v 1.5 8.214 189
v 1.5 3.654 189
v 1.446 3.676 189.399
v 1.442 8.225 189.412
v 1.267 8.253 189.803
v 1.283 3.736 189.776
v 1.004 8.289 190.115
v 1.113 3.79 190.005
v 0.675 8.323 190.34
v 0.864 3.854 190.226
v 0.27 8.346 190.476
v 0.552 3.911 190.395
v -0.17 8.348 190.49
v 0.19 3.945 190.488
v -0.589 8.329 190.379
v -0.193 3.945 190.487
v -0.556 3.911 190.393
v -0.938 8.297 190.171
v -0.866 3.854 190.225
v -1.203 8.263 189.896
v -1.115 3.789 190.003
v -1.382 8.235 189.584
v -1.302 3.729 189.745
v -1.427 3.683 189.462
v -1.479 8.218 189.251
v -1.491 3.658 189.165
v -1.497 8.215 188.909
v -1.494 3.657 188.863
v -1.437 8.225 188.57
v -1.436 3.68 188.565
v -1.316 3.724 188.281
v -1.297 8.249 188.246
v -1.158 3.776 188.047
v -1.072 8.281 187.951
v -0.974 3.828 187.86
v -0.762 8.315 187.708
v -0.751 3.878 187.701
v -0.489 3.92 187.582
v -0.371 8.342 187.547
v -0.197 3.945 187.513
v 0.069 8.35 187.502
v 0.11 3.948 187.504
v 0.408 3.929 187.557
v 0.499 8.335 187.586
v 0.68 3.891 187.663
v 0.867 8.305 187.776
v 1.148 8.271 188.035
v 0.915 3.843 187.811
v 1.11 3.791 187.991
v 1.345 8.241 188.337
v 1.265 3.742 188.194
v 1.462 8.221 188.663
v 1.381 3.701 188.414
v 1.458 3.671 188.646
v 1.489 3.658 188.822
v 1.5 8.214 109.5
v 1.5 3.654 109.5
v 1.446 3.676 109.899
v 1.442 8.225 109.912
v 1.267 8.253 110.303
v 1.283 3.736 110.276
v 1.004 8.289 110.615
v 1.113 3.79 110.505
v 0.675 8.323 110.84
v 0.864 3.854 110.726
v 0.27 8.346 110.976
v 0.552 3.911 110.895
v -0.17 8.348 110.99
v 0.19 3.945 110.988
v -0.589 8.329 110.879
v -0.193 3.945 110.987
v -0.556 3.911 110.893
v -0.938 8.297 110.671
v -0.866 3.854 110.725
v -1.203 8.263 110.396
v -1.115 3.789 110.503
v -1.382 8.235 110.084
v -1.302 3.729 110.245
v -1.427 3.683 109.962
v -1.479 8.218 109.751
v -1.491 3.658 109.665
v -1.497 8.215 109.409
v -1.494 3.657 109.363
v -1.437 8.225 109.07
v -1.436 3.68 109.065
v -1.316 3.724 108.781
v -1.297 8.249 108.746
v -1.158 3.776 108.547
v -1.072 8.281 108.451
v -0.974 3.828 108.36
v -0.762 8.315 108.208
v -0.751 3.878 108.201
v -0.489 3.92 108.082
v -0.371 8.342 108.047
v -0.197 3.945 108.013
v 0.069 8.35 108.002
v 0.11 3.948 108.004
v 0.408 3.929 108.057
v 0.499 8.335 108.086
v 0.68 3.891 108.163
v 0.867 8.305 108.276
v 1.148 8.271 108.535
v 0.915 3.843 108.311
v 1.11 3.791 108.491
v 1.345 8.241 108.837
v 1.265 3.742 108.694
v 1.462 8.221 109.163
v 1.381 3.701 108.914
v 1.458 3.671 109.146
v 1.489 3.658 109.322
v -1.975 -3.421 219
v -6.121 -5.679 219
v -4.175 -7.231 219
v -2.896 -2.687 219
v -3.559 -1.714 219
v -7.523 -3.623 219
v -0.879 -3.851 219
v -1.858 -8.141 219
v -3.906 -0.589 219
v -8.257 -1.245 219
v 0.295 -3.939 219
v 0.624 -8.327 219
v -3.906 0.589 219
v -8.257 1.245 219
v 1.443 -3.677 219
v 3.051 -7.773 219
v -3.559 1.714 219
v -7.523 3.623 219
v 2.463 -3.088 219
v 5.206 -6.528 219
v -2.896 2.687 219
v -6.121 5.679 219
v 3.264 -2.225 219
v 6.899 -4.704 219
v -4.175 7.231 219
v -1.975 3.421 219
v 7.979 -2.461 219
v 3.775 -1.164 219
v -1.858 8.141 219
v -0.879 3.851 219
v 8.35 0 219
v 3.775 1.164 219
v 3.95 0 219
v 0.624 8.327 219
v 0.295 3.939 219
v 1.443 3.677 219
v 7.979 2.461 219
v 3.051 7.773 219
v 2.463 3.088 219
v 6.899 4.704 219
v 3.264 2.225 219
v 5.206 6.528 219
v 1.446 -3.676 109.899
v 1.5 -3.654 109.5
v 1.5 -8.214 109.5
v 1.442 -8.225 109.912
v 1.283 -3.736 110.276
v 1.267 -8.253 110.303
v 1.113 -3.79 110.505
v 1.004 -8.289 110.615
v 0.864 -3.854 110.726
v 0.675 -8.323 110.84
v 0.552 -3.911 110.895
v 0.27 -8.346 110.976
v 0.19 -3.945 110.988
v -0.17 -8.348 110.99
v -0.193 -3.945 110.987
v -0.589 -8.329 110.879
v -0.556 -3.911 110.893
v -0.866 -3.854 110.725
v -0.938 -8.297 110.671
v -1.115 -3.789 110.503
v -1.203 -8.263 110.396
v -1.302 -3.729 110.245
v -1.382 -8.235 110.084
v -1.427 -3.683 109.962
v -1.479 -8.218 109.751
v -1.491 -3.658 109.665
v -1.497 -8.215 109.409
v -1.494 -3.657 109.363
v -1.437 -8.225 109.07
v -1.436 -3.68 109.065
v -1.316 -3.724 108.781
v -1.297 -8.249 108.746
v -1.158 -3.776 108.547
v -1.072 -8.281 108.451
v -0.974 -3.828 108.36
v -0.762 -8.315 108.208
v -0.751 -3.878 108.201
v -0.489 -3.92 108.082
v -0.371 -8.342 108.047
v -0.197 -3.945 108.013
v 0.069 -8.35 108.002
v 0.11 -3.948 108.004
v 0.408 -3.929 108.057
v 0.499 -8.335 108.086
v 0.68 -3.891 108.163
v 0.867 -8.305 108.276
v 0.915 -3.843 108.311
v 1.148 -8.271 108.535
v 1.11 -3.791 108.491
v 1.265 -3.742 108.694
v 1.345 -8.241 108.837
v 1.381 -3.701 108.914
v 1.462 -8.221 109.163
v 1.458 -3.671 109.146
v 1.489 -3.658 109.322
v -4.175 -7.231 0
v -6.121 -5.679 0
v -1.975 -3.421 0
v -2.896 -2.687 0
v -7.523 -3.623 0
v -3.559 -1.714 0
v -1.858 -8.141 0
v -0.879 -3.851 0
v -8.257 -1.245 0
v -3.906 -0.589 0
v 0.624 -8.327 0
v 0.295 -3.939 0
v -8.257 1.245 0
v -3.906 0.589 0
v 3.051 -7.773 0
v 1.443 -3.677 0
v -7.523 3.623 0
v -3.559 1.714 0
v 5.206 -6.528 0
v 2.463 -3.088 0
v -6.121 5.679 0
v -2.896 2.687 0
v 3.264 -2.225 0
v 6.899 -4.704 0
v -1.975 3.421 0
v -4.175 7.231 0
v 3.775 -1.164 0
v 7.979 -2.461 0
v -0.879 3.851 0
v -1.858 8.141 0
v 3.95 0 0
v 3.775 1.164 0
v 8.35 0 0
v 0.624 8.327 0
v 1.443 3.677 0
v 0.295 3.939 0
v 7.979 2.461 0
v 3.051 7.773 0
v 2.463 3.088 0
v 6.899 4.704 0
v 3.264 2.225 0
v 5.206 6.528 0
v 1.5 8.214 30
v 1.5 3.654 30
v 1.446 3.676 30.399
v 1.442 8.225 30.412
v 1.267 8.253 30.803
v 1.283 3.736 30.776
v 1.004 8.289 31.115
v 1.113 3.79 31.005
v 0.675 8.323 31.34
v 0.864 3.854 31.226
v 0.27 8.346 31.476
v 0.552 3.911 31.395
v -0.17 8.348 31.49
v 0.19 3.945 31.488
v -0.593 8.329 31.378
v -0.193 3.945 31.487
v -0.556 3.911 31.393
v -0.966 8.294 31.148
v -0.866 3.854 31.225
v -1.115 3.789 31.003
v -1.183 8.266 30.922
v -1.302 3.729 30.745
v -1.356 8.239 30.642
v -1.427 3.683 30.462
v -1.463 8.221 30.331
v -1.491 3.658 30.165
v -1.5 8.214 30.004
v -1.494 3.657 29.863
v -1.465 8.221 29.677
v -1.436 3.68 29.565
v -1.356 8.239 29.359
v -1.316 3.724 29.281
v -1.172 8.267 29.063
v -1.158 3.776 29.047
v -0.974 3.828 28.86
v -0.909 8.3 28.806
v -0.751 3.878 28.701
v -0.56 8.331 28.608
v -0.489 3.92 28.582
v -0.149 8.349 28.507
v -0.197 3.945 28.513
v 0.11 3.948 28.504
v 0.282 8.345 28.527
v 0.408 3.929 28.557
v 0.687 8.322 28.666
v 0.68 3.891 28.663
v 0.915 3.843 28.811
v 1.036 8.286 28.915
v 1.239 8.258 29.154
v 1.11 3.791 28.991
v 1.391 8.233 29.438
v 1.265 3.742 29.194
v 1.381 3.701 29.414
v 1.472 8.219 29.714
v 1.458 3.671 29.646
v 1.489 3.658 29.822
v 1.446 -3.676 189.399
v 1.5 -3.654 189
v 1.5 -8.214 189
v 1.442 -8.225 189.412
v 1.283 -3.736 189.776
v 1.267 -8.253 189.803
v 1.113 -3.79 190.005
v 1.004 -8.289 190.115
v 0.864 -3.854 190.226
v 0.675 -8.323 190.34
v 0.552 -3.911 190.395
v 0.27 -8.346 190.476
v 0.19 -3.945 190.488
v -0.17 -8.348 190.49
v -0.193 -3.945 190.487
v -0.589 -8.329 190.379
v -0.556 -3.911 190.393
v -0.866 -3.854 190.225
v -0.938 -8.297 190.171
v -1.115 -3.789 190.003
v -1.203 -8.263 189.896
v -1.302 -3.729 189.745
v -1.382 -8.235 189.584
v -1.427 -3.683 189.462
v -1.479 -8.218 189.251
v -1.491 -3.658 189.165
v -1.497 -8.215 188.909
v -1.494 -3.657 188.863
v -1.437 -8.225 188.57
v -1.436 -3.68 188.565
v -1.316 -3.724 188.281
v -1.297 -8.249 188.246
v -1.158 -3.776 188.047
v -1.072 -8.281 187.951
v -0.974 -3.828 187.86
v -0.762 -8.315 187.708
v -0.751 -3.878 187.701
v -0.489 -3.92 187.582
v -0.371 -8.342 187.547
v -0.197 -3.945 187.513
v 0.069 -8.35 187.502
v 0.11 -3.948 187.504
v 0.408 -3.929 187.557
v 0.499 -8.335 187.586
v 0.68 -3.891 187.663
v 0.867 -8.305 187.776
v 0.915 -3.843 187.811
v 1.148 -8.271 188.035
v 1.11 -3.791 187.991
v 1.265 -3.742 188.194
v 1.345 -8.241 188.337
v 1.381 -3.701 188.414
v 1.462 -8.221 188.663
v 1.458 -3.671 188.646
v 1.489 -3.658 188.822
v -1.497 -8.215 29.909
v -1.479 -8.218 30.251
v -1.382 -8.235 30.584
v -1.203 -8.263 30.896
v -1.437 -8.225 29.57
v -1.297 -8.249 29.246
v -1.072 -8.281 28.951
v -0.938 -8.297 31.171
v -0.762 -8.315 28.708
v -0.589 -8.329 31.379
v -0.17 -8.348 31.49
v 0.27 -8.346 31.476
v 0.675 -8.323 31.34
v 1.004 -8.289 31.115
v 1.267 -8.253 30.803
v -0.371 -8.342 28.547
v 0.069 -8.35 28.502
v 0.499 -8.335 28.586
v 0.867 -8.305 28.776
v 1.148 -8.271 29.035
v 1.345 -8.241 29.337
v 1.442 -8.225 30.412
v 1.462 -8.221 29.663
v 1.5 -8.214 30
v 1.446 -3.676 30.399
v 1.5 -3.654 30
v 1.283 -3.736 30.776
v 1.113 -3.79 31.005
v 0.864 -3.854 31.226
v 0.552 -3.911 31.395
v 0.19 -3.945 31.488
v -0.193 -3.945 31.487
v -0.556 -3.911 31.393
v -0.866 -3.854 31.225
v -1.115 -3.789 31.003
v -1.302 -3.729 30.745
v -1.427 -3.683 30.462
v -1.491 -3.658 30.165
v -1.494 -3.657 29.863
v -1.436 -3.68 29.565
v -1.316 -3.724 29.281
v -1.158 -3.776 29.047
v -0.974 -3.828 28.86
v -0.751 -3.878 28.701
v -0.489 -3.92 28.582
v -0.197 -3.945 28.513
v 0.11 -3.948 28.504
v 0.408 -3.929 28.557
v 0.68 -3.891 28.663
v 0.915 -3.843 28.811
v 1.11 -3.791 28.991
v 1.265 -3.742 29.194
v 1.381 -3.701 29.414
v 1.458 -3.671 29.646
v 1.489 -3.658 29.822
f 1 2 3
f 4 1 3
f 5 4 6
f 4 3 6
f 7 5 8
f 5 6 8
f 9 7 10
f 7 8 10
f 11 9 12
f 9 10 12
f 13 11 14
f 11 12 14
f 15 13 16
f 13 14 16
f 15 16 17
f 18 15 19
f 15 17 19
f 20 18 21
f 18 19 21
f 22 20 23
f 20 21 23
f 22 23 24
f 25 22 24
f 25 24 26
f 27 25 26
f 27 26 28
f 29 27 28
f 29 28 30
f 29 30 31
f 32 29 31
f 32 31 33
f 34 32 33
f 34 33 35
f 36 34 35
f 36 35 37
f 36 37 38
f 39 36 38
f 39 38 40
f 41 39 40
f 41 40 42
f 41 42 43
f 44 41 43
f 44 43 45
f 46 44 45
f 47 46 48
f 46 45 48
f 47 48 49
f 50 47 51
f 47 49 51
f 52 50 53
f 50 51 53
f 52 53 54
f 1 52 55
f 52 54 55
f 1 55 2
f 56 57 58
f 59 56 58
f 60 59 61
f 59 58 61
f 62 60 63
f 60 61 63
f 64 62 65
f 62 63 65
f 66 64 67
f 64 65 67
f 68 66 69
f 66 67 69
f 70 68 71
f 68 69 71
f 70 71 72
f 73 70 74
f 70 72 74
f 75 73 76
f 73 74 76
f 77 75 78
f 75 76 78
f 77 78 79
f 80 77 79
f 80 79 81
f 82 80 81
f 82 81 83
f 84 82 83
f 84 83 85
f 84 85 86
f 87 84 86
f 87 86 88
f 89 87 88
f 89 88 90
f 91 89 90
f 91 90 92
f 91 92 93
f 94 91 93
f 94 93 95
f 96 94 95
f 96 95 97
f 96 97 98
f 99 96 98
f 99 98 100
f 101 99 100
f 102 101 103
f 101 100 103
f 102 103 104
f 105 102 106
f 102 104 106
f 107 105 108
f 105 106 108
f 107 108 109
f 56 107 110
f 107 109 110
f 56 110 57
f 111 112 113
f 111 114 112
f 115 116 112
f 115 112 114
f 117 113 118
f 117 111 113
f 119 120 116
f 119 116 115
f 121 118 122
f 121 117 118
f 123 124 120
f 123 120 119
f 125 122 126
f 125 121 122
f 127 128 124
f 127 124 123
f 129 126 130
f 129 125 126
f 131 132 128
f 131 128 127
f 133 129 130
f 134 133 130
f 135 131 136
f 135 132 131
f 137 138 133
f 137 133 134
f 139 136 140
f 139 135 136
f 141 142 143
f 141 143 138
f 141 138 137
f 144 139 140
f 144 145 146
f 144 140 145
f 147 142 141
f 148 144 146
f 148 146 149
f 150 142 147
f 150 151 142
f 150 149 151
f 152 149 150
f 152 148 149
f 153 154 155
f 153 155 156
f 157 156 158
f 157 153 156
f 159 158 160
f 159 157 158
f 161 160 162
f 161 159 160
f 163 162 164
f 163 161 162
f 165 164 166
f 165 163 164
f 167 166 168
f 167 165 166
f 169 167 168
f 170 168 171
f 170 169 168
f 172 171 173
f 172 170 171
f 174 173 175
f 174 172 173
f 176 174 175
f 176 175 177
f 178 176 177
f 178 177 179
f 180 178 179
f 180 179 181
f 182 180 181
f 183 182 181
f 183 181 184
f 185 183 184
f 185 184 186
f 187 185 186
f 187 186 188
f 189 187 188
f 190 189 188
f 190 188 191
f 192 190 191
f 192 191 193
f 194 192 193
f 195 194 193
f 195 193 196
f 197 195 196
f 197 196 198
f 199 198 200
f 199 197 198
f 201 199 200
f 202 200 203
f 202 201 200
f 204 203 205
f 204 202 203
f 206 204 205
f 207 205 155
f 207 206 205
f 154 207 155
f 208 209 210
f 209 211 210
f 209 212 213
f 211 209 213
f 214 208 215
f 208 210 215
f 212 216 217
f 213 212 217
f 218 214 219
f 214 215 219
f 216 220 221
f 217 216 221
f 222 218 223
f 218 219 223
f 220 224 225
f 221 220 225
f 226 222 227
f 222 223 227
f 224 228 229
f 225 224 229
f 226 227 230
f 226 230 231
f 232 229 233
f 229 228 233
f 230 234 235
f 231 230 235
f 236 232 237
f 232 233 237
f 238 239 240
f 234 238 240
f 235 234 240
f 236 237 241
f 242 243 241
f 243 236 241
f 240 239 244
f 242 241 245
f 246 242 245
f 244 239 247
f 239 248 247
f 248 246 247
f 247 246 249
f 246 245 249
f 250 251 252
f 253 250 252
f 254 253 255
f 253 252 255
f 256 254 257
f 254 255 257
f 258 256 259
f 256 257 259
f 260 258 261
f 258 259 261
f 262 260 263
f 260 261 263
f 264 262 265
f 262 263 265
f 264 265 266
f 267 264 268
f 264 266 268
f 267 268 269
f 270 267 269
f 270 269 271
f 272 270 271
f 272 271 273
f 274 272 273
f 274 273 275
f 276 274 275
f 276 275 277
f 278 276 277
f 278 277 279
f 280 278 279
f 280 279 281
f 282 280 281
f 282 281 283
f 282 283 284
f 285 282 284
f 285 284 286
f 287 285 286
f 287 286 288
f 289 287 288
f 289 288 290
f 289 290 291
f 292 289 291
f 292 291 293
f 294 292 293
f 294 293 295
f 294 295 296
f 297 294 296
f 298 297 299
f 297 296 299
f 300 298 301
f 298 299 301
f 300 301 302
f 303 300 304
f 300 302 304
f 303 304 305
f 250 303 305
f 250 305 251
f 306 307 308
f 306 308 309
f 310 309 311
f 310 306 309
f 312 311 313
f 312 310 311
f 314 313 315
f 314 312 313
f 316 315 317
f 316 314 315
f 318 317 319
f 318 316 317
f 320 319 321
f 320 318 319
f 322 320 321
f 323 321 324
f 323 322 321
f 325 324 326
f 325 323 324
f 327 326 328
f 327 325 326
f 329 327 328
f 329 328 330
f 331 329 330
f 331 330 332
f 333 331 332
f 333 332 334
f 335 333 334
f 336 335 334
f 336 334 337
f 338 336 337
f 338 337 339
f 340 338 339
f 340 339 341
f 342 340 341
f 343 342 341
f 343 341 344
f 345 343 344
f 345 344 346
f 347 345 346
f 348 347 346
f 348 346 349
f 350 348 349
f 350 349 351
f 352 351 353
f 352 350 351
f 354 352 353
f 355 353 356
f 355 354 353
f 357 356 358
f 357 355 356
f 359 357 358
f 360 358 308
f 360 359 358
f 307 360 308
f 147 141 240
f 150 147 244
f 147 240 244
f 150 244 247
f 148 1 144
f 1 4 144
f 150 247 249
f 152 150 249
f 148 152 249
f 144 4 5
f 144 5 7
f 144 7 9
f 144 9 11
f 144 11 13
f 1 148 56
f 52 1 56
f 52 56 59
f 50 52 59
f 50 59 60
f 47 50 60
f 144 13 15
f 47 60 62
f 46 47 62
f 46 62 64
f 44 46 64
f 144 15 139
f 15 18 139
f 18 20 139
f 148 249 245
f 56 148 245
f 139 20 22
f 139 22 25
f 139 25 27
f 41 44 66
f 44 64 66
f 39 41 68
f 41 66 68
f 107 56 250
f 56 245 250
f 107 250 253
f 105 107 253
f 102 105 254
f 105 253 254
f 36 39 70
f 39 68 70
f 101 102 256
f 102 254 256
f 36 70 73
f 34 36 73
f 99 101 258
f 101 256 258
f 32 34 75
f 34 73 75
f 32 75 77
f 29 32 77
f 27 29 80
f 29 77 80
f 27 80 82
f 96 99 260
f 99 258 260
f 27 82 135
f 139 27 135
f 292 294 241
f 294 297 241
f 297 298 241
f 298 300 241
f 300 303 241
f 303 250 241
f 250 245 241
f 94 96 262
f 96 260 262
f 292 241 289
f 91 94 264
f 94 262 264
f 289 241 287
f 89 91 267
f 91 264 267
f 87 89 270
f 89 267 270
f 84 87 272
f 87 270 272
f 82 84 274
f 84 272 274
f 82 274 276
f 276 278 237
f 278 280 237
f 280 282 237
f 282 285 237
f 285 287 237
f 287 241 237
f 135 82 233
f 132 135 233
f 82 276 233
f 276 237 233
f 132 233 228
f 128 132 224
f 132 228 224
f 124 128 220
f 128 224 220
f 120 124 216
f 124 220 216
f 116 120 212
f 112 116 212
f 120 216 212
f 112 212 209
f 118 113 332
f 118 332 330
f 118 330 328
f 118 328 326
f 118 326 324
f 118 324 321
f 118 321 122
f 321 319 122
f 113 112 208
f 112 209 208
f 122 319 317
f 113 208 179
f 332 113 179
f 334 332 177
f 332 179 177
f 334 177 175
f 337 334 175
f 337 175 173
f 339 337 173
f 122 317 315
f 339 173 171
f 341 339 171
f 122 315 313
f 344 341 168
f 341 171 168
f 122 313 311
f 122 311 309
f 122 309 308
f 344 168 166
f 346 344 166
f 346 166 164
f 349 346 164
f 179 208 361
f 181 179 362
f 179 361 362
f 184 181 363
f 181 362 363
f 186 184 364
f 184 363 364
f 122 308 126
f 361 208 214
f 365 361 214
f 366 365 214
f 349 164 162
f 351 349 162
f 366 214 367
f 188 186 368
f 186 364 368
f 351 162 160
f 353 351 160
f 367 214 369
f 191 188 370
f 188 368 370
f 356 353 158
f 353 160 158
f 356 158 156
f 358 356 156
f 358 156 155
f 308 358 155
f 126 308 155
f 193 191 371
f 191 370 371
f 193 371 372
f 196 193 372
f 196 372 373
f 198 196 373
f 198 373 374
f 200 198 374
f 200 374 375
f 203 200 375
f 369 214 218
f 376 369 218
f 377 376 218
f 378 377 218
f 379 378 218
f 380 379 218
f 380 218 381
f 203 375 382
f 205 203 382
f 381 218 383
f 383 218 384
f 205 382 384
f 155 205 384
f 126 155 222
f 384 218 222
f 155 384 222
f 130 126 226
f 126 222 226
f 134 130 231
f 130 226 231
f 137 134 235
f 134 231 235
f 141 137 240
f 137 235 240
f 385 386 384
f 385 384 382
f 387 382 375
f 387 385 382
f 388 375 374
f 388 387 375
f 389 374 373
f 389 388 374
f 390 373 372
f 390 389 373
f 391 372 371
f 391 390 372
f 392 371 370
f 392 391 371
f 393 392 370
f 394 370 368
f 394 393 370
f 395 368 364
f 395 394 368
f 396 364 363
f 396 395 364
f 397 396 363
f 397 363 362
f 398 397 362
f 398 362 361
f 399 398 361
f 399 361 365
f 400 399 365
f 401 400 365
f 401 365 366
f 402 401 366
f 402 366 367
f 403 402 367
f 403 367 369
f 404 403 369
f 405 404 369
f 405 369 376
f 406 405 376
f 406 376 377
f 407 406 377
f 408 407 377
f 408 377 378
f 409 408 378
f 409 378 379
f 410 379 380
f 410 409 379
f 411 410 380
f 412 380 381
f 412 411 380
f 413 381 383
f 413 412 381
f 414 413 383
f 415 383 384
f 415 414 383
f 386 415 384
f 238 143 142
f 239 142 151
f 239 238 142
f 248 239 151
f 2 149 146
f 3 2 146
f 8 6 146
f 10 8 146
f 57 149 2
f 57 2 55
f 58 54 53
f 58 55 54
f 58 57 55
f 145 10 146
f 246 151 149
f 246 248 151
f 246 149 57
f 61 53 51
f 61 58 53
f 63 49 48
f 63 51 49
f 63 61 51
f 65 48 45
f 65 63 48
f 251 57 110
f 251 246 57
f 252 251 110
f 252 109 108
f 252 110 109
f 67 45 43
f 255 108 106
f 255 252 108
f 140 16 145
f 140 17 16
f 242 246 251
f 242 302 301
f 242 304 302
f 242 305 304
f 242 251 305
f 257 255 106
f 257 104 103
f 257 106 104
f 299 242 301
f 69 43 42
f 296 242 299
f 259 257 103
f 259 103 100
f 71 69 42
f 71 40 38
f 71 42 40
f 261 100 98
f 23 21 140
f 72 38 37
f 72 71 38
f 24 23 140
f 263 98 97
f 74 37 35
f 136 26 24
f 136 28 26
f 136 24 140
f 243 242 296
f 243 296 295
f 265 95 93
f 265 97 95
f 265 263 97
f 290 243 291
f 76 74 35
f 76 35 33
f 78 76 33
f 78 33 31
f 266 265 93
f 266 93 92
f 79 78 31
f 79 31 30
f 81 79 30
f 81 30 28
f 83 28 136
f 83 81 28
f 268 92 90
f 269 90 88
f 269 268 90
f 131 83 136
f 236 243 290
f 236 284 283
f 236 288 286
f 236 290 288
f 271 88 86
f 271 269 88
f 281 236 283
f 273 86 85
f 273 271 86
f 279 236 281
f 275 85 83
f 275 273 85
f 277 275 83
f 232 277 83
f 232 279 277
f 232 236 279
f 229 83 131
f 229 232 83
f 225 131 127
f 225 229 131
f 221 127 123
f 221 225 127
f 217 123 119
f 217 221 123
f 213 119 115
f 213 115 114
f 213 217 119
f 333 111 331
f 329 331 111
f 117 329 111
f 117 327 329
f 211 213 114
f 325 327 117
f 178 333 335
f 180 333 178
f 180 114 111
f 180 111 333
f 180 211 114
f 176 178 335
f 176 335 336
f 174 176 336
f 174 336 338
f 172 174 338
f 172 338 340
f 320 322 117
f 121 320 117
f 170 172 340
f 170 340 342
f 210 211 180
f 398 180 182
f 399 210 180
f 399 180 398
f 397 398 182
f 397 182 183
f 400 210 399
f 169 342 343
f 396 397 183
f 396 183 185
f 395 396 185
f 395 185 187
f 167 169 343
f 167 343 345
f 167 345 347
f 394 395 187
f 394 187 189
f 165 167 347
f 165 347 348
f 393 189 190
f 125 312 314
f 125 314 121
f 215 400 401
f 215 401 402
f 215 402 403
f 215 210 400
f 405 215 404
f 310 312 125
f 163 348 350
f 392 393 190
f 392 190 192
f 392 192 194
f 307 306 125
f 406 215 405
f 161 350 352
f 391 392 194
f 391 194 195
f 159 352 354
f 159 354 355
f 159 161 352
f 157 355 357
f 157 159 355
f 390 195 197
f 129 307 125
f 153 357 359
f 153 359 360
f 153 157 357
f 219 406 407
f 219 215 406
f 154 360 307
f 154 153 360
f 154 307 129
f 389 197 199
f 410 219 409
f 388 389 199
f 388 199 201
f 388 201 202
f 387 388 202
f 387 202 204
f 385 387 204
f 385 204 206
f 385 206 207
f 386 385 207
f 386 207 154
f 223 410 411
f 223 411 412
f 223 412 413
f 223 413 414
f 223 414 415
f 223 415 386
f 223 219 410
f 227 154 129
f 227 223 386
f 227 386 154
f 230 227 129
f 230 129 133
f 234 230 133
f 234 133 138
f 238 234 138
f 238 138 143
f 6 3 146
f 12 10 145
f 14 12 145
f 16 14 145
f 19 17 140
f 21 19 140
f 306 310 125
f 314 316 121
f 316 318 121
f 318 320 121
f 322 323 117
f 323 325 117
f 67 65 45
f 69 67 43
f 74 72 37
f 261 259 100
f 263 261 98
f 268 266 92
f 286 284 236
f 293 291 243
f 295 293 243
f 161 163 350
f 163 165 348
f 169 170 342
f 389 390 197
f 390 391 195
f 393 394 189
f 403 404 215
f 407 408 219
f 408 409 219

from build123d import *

# Parameters (mm, degrees)
SKETCH_R          = 8.35
SKETCH_R_2        = 3.95
PAD_DEPTH         = 219
SKETCH001_R       = 1.5
POCKET_DEPTH      = 100
POCKET_DEPTH_BACK = -100


with BuildPart() as part:
    # Sketch → Pad (new body)
    with BuildSketch(Plane.XY):
        Circle(SKETCH_R)
        Circle(SKETCH_R_2, mode=Mode.SUBTRACT)
    extrude(amount=PAD_DEPTH)

    # Sketch001 → Pocket (cut, two sides)
    with BuildSketch(Plane.XZ) as pocket_sk:
        with Locations((0, 109.5)):
            Circle(SKETCH001_R)
        with Locations((0, 189)):
            Circle(SKETCH001_R)
        with Locations((0, 30)):
            Circle(SKETCH001_R)
    extrude(amount=-POCKET_DEPTH, mode=Mode.SUBTRACT)
    extrude(pocket_sk.sketch, amount=-POCKET_DEPTH_BACK, mode=Mode.SUBTRACT)


solid = part.part
